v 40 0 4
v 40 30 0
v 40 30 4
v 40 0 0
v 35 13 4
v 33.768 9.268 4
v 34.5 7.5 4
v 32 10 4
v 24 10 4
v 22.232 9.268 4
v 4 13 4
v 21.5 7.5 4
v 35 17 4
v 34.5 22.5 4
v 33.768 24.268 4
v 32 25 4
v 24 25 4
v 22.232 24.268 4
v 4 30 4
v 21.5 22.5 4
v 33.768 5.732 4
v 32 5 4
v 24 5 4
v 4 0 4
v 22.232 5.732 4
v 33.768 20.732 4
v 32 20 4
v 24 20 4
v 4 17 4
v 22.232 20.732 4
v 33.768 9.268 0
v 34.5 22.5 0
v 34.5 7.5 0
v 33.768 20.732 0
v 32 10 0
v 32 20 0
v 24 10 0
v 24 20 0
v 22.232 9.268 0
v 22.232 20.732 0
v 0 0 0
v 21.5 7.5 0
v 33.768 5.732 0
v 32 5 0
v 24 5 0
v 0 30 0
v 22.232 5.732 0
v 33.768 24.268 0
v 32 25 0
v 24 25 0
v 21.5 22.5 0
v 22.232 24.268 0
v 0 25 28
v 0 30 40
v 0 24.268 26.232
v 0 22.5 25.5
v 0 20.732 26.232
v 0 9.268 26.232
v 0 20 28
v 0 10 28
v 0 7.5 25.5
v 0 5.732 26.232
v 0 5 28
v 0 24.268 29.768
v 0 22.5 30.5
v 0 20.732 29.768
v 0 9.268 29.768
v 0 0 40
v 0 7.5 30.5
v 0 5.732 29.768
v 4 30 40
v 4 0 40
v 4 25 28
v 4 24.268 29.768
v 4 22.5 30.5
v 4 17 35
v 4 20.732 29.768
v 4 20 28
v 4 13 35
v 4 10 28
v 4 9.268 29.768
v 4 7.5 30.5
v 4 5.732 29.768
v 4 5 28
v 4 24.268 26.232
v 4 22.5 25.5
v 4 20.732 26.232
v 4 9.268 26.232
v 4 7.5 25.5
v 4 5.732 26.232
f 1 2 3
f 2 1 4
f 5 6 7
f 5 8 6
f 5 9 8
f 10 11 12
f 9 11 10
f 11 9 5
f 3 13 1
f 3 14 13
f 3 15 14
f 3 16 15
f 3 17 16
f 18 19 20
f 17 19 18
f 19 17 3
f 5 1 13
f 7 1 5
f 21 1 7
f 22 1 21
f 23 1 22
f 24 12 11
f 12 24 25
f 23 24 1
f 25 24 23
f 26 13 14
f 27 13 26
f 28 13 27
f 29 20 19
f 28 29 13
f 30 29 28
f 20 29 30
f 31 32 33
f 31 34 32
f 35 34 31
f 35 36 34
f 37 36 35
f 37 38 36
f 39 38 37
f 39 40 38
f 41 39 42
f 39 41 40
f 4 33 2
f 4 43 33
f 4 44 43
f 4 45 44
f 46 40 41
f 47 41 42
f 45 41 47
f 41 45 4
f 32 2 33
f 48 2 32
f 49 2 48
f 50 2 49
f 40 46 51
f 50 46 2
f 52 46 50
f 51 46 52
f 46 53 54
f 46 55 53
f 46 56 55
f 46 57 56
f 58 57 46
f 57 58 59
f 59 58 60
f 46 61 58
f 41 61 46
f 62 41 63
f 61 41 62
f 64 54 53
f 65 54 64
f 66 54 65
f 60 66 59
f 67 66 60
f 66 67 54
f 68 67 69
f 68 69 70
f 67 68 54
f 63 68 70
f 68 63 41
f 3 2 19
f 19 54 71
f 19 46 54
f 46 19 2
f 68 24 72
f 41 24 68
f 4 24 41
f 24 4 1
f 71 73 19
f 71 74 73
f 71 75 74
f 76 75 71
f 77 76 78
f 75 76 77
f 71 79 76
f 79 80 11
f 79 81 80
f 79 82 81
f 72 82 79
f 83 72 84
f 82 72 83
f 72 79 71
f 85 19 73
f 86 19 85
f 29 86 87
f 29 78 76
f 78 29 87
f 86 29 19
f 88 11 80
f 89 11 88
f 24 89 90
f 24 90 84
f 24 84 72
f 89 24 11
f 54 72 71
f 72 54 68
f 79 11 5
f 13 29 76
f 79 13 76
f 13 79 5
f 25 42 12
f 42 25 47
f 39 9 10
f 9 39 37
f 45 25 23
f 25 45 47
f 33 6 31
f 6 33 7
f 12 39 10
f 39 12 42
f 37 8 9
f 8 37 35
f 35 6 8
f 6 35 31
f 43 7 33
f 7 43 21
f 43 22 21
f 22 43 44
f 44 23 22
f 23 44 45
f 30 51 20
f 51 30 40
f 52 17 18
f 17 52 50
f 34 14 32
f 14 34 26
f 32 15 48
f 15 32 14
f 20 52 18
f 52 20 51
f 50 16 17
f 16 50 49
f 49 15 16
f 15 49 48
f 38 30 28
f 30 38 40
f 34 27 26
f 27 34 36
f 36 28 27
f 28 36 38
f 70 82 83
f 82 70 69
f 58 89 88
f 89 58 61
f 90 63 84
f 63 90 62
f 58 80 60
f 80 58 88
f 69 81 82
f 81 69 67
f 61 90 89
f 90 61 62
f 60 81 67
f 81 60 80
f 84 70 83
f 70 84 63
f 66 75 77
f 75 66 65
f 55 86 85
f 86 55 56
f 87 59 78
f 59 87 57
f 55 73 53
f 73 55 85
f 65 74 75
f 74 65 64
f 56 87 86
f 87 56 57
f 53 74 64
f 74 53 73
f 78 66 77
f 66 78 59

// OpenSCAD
// Zweck: Winkel (L-Halter) mit Versteifungsrippe und Langlöchern.
w = 30; l = 40; t = 4;
// Langloch ohne hull(): zwei Kreise und ein Rechteck
module slot(len, d) {
    translate([-len / 2, 0]) circle(d = d);
    translate([len / 2, 0]) circle(d = d);
    square([len, d], center = true);
}
difference() {
    union() {
        cube([l, w, t]);
        cube([t, w, l]);
        // Rippe
        translate([0, w / 2 - t / 2, 0]) rotate([90, 0, 0]) mirror([0, 0, 1])
            linear_extrude(height = t) polygon([[t, t], [l - 5, t], [t, l - 5]]);
    }
    translate([l - 12, w / 4, -1]) linear_extrude(t + 2) slot(8, 5);
    translate([l - 12, 3 * w / 4, -1]) linear_extrude(t + 2) slot(8, 5);
    translate([-1, w / 4, l - 12]) rotate([0, 90, 0]) cylinder(h = t + 2, d = 5);
    translate([-1, 3 * w / 4, l - 12]) rotate([0, 90, 0]) cylinder(h = t + 2, d = 5);
}
